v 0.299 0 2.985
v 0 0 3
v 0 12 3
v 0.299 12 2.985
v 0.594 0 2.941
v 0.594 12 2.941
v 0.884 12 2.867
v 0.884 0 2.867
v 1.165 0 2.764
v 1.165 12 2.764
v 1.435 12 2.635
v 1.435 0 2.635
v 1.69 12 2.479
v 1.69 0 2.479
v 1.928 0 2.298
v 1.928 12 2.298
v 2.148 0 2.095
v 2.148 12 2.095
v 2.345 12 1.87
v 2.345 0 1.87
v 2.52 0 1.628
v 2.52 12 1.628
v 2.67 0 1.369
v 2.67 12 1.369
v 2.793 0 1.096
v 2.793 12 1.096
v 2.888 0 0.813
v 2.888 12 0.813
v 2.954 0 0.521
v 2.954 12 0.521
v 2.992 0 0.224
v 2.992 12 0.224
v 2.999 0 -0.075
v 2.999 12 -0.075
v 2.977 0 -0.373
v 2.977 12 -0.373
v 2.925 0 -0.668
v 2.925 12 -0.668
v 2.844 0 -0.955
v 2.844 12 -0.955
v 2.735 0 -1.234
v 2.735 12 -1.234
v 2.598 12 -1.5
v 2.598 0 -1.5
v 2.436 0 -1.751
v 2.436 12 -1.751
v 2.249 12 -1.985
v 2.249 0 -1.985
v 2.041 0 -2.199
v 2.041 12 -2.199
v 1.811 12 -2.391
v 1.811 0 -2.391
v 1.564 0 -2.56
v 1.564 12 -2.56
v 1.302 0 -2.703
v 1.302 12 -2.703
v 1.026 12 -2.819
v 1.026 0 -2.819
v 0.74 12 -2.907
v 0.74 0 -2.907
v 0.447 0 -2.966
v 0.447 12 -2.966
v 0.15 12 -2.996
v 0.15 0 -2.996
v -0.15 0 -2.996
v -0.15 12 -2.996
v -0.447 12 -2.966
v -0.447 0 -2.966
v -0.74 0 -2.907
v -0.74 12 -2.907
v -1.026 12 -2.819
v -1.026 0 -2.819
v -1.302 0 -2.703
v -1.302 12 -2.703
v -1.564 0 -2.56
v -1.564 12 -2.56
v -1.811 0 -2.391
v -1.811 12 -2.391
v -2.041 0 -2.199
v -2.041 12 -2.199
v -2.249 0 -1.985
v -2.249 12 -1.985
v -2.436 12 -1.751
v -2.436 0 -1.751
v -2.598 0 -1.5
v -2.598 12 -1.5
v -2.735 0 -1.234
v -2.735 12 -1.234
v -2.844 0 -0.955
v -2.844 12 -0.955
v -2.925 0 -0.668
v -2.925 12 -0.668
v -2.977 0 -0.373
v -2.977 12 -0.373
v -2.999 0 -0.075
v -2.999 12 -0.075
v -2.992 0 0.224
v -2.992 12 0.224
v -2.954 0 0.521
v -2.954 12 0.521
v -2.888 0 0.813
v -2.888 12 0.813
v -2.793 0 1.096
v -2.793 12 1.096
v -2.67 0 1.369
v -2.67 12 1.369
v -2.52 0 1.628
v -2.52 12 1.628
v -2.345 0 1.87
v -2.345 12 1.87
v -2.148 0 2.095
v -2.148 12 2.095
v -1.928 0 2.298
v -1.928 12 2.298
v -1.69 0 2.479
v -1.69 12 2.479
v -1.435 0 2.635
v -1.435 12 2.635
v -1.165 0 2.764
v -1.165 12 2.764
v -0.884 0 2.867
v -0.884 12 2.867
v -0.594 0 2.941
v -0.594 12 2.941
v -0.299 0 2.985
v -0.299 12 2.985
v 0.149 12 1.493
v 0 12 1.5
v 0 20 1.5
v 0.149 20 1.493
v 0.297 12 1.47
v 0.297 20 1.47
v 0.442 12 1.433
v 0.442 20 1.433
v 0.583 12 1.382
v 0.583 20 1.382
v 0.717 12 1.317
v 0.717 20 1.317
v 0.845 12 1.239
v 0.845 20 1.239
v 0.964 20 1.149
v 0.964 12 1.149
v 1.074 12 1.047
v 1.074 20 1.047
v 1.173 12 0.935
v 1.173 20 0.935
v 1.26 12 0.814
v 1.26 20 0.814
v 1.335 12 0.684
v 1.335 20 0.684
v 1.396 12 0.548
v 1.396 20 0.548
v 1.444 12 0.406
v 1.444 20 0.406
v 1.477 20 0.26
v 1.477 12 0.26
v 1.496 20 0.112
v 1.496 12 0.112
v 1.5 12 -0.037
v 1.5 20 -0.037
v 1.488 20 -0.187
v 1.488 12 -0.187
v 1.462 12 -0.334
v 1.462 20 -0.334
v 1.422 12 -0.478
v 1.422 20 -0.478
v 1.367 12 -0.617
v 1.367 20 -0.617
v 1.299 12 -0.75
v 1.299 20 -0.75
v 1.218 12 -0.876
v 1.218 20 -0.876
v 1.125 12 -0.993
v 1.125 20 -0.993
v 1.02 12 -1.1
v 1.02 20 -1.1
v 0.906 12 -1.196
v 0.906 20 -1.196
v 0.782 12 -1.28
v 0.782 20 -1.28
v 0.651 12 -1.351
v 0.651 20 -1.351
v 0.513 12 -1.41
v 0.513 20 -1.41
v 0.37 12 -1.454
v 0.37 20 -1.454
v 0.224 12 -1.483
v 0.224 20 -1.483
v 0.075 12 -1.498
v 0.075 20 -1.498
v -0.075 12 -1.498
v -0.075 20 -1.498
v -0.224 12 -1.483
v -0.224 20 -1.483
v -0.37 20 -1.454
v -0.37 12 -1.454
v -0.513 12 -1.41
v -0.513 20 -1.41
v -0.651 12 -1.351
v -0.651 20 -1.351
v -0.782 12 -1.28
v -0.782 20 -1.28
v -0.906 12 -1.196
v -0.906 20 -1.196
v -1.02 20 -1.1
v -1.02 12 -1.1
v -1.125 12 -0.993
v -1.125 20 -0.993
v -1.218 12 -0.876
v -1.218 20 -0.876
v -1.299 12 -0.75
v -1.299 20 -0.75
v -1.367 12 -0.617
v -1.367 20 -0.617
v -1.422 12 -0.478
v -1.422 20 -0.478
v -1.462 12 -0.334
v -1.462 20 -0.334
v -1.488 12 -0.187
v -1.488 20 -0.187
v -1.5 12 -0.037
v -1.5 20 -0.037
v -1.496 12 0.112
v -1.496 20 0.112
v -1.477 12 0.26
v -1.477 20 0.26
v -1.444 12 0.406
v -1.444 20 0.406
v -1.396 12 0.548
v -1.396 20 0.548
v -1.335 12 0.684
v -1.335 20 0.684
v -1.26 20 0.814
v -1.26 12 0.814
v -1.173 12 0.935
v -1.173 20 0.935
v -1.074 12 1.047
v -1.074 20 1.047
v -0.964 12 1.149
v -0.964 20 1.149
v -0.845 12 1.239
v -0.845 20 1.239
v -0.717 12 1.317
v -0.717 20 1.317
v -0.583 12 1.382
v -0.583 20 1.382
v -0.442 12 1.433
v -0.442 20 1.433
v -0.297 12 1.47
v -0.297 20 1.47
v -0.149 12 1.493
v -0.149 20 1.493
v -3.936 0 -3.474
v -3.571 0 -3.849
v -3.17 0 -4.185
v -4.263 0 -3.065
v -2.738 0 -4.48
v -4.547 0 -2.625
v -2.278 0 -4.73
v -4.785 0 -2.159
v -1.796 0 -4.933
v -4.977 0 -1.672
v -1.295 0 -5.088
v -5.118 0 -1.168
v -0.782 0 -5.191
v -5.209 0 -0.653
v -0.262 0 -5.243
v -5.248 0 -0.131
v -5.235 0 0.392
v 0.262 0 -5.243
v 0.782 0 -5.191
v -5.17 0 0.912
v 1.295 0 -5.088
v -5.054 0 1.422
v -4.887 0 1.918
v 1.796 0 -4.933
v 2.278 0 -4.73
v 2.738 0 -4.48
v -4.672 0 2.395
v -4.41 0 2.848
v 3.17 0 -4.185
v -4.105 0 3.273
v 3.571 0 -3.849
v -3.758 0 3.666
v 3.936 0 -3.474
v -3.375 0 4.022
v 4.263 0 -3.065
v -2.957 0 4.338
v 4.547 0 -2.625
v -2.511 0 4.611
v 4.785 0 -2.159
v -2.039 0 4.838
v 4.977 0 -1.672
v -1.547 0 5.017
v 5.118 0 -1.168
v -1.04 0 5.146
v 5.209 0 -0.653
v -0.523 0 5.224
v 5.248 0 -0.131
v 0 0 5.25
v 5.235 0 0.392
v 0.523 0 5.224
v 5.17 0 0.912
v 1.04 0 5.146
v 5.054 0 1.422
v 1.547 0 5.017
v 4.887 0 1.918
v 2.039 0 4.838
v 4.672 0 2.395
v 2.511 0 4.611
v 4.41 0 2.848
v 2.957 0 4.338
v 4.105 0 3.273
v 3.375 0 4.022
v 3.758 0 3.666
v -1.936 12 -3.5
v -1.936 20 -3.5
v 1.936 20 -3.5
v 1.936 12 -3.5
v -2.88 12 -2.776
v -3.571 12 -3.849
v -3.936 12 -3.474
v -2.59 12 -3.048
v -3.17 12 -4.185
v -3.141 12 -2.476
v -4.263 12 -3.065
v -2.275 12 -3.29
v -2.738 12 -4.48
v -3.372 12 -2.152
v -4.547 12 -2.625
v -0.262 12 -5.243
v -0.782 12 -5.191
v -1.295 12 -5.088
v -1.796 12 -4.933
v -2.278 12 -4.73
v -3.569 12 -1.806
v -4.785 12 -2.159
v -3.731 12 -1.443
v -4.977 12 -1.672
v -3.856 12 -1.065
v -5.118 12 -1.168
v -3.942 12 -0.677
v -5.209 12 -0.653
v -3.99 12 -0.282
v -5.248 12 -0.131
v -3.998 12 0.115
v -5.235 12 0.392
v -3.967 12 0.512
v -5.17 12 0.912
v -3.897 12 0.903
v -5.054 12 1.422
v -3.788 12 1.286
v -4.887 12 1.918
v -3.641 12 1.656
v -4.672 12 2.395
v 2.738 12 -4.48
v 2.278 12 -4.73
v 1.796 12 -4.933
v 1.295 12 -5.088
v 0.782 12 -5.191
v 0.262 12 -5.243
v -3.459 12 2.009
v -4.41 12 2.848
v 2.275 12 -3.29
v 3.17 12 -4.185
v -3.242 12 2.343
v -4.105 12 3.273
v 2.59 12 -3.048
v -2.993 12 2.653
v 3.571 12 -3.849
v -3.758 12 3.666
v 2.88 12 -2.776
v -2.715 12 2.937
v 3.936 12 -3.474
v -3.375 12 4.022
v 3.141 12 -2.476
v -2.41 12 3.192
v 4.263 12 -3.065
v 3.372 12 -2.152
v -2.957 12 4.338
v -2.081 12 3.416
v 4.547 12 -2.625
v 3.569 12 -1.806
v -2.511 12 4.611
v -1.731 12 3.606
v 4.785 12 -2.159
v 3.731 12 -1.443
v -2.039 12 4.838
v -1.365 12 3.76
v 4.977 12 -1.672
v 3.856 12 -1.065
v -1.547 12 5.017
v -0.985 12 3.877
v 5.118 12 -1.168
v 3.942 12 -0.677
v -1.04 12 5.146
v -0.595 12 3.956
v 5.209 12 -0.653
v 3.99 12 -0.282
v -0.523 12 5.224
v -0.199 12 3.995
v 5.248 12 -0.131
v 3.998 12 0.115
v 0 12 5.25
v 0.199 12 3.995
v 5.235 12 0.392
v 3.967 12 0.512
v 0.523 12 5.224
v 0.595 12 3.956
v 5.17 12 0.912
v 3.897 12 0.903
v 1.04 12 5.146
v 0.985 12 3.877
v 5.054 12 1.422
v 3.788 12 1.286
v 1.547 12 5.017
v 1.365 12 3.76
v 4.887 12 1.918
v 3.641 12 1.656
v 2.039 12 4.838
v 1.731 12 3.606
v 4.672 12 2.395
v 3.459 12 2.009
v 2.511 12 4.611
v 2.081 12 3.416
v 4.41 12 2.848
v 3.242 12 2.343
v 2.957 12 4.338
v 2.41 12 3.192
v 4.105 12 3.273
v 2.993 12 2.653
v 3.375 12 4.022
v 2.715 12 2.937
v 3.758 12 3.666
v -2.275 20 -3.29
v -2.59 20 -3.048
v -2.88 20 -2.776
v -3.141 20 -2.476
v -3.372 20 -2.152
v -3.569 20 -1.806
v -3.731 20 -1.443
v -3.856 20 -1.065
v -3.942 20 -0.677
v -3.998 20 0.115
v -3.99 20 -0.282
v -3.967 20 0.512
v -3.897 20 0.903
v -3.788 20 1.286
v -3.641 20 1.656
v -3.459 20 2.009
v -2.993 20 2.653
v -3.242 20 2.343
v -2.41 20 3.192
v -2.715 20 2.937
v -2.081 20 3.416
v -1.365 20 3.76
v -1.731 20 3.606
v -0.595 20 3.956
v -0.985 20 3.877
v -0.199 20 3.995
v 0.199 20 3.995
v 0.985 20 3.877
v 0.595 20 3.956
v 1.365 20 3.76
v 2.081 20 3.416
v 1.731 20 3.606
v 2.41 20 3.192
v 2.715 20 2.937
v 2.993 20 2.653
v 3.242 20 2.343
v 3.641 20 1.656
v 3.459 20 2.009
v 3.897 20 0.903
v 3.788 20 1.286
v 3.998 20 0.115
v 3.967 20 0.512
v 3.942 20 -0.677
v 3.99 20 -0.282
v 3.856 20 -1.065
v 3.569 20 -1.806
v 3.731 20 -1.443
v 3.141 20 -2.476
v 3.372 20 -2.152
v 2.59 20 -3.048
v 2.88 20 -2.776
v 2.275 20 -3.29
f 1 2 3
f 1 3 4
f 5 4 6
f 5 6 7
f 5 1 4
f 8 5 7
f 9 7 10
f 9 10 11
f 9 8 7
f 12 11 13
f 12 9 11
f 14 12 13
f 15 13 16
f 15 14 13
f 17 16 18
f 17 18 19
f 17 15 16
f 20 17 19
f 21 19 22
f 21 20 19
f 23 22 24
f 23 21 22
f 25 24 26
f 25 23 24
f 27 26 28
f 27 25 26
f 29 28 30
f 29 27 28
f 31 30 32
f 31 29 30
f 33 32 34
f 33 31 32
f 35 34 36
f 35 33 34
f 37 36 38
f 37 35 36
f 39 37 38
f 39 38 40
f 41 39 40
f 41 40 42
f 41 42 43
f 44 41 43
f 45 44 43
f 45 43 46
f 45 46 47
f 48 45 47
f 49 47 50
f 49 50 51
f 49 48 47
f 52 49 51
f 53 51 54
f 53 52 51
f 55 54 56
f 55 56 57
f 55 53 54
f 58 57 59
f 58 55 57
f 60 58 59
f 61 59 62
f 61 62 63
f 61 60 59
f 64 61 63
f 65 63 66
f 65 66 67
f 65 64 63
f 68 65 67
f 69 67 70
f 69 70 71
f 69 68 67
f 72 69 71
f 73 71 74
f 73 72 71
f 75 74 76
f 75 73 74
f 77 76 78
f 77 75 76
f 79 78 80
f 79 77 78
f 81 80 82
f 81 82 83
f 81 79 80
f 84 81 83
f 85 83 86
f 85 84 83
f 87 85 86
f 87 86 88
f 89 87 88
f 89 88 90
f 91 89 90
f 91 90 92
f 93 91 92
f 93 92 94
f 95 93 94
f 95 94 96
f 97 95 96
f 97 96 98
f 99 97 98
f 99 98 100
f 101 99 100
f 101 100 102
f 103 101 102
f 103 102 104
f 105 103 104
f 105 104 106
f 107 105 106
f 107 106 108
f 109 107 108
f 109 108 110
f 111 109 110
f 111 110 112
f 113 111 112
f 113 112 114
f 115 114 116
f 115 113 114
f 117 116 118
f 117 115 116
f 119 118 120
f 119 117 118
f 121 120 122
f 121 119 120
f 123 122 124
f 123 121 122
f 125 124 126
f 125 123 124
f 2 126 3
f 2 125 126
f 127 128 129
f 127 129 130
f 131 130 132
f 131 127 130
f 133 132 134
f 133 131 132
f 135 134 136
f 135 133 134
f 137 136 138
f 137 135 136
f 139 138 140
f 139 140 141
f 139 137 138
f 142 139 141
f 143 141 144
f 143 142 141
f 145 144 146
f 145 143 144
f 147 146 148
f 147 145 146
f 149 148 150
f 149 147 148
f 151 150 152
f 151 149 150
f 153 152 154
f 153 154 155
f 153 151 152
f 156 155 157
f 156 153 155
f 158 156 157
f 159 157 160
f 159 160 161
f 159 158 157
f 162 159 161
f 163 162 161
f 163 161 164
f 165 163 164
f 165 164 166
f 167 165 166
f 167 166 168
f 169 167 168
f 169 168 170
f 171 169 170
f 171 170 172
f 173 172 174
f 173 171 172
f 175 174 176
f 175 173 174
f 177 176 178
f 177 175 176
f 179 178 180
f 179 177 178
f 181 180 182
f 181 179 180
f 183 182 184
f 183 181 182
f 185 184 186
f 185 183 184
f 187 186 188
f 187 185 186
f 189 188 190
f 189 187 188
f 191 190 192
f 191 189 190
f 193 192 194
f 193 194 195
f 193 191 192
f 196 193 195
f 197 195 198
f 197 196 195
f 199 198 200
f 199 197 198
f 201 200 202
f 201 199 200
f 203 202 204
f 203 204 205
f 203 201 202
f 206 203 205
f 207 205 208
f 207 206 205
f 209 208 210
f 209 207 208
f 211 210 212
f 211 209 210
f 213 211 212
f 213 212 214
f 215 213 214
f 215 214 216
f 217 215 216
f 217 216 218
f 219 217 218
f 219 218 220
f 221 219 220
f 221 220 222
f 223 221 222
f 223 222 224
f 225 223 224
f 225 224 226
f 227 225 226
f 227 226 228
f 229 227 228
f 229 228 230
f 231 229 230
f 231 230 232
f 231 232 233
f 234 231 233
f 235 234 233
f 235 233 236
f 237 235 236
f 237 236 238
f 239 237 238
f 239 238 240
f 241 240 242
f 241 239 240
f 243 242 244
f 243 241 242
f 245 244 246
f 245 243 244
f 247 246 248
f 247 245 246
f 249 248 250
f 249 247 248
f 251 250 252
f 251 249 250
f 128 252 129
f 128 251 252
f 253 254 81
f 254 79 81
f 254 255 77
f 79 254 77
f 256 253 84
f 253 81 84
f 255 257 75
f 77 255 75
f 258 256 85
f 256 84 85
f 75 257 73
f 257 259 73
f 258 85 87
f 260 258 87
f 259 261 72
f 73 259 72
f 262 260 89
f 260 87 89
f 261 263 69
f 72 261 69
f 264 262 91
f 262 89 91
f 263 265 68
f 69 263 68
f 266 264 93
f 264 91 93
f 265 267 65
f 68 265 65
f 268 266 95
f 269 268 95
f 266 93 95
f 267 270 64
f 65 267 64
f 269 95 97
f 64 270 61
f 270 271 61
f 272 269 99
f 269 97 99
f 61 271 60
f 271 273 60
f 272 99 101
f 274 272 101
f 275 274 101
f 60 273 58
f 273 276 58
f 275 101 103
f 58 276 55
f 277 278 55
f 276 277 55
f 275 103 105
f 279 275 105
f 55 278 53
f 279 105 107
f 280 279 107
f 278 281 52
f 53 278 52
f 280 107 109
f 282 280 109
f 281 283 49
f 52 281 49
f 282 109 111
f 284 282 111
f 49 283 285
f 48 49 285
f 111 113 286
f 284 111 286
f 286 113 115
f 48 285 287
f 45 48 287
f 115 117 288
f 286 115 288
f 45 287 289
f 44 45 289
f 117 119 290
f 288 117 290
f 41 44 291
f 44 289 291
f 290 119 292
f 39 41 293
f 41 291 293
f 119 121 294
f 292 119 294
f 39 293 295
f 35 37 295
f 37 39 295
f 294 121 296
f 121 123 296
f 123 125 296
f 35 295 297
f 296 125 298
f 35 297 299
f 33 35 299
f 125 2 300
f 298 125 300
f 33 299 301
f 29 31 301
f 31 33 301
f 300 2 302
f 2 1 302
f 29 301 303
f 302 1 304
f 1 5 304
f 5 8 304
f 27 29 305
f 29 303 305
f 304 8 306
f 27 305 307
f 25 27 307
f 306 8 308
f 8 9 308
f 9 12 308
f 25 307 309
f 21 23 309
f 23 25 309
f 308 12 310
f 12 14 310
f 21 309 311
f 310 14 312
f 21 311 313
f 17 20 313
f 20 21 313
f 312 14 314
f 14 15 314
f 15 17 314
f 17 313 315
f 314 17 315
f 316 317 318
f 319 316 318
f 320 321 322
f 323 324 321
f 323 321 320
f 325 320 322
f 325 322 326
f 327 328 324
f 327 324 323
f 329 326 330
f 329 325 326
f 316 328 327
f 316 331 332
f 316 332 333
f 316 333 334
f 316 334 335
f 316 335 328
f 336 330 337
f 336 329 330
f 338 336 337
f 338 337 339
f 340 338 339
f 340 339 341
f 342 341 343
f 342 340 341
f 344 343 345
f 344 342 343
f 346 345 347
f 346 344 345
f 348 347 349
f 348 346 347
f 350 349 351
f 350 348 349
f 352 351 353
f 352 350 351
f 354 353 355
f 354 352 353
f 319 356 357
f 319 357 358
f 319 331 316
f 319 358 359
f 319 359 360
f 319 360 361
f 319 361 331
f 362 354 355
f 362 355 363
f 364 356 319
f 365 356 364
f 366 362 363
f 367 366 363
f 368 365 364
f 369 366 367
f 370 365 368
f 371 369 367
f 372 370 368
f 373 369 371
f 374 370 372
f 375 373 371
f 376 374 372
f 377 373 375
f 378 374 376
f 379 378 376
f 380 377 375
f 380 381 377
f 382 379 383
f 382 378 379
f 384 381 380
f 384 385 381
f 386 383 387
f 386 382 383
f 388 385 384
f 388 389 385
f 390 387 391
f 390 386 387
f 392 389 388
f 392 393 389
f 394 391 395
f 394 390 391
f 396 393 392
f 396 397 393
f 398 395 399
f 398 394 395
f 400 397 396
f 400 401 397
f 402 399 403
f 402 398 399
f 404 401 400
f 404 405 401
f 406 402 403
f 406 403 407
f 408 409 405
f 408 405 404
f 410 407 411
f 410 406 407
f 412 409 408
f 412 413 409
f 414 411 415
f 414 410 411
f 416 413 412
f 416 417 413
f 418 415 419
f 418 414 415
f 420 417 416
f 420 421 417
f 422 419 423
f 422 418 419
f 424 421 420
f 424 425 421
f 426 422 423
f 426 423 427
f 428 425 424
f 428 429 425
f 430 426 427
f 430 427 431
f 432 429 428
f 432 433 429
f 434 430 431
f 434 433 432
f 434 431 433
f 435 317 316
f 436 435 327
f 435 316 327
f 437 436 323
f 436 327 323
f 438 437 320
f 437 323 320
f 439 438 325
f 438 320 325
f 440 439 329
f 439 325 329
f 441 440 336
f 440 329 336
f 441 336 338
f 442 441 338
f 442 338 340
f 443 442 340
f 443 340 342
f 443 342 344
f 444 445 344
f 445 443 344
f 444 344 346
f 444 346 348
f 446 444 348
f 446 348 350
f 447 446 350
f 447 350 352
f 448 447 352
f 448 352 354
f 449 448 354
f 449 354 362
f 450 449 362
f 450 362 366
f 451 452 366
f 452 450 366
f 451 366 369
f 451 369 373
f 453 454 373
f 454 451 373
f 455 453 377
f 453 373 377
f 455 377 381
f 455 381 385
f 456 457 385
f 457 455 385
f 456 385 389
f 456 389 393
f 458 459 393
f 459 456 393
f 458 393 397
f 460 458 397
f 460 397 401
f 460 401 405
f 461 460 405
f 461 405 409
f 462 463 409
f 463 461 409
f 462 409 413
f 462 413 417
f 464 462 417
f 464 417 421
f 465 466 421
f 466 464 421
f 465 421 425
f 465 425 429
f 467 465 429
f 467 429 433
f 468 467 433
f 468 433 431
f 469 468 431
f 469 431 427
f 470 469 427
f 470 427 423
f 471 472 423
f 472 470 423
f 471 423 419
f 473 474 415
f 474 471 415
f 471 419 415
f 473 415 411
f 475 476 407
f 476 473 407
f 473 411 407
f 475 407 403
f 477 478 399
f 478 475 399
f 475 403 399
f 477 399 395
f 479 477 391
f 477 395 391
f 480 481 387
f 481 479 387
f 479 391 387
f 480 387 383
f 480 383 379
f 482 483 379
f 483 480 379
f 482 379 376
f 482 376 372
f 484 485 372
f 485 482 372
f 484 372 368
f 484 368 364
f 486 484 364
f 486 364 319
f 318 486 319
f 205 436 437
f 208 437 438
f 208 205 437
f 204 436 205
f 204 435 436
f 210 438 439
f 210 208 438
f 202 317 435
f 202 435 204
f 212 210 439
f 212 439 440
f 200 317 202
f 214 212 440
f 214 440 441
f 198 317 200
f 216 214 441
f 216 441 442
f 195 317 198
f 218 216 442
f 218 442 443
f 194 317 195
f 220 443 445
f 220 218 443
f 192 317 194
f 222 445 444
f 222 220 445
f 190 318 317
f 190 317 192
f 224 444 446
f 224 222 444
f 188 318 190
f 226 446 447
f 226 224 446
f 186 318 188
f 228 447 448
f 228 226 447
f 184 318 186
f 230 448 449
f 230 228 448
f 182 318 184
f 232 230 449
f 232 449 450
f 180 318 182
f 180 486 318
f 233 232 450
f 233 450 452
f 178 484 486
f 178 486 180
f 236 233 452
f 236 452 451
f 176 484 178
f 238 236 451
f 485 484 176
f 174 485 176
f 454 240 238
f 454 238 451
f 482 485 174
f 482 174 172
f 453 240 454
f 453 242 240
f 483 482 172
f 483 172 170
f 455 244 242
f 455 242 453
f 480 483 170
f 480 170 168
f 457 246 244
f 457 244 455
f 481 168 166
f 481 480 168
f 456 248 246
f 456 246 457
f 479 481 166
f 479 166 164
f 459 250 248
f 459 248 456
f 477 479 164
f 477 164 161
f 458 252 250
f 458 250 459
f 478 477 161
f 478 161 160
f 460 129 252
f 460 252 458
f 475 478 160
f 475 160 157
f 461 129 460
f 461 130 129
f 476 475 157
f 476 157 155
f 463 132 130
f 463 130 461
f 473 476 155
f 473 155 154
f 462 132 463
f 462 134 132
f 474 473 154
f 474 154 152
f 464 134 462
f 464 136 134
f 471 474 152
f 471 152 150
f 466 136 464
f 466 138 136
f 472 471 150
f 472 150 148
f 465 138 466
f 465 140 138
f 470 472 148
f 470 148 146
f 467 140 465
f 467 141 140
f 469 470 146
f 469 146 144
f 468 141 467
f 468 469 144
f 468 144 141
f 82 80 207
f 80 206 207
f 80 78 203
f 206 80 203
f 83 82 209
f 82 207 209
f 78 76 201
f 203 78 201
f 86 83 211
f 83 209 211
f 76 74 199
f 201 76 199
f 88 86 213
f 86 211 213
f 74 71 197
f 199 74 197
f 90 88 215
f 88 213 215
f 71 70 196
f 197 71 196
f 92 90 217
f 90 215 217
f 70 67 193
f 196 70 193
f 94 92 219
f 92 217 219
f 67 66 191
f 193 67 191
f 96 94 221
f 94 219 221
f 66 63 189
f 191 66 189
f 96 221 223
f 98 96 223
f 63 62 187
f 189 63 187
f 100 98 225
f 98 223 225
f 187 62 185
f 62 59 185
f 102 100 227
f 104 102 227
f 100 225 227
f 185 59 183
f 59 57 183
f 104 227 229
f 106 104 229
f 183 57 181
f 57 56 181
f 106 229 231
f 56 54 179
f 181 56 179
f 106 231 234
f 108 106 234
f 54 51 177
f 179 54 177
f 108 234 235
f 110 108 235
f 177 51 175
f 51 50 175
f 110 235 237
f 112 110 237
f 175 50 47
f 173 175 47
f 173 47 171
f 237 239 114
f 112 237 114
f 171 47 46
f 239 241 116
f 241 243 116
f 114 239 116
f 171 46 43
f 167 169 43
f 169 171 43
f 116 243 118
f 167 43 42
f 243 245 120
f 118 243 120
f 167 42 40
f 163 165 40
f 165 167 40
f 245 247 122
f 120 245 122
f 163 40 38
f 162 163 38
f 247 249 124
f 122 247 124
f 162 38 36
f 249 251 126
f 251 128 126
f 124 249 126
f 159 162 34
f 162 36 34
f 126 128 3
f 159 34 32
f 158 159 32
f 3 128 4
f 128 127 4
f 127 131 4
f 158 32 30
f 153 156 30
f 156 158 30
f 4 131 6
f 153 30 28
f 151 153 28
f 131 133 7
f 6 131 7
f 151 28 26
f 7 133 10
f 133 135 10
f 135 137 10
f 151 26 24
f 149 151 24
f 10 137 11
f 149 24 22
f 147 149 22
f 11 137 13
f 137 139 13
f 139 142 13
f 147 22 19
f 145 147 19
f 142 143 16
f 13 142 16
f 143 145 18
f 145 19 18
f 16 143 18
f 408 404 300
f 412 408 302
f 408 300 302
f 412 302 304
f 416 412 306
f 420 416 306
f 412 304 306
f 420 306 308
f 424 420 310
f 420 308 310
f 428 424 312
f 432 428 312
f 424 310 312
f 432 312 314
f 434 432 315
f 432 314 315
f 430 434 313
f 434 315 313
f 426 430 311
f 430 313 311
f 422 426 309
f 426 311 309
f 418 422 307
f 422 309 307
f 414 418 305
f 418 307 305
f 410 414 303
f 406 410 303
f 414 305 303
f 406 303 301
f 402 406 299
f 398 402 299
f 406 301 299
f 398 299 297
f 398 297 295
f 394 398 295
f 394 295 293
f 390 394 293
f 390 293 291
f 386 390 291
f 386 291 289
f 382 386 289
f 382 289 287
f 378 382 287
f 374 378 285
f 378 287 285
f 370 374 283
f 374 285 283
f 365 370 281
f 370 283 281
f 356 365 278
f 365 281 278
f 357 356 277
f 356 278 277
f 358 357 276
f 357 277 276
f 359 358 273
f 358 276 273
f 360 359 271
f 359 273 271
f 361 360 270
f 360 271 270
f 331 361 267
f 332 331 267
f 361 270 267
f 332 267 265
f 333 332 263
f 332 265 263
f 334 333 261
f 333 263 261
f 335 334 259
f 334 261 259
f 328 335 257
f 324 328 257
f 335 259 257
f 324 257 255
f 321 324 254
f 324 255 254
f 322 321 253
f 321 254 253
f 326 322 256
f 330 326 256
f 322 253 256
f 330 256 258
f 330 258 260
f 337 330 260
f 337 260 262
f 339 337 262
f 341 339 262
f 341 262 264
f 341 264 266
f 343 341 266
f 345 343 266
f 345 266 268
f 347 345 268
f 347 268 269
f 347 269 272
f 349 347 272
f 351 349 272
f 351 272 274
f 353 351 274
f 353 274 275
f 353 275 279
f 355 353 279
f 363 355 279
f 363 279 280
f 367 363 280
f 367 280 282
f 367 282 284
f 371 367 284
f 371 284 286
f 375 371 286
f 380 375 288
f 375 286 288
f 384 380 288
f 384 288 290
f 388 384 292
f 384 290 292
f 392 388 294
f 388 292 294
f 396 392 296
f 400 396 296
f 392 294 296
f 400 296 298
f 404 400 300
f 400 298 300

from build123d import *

# Parameters (mm, degrees)
SKETCH1_R           = 5.25
SKETCH1_R_2         = 3
BOSS_EXTRUDE1_DEPTH = 12
SKETCH2_R           = 4
SKETCH2_R_2         = 1.5
BOSS_EXTRUDE2_DEPTH = 8
CUT_EXTRUDE2_START  = -8
CUT_EXTRUDE2_DEPTH  = 8


with BuildPart() as part:
    # Sketch1 → Boss-Extrude1 (new body)
    with BuildSketch(Plane(origin=(0, 0, 0), x_dir=(1, 0, 0), z_dir=(0, 1, 0))):
        with Locations(Location((0, 0, 0), (0, 0, 270))):
            Circle(SKETCH1_R)
        with Locations(Location((0, 0, 0), (0, 0, 270))):
            Circle(SKETCH1_R_2, mode=Mode.SUBTRACT)
    extrude(amount=BOSS_EXTRUDE1_DEPTH)

    # Sketch2 → Boss-Extrude2 (add)
    with BuildSketch(Plane(origin=(0, 12, 0), x_dir=(1, 0, 0), z_dir=(0, 1, 0))):
        with Locations(Location((0, 0, 0), (0, 0, 270))):
            Circle(SKETCH2_R)
        with Locations(Location((0, 0, 0), (0, 0, 270))):
            Circle(SKETCH2_R_2, mode=Mode.SUBTRACT)
    extrude(amount=BOSS_EXTRUDE2_DEPTH)

    # Sketch4 → Cut-Extrude2 (cut)
    with BuildSketch(Plane(origin=(0, 20, 0), x_dir=(1, 0, 0), z_dir=(0, 1, 0)).offset(CUT_EXTRUDE2_START)):
        with BuildLine():
            Line((-1.936491673, 3.5), (1.936491673, 3.5))
            ThreePointArc((1.936491673, 3.5), (0, 4), (-1.936491673, 3.5))
        make_face()
    extrude(amount=CUT_EXTRUDE2_DEPTH, mode=Mode.SUBTRACT)


solid = part.part
